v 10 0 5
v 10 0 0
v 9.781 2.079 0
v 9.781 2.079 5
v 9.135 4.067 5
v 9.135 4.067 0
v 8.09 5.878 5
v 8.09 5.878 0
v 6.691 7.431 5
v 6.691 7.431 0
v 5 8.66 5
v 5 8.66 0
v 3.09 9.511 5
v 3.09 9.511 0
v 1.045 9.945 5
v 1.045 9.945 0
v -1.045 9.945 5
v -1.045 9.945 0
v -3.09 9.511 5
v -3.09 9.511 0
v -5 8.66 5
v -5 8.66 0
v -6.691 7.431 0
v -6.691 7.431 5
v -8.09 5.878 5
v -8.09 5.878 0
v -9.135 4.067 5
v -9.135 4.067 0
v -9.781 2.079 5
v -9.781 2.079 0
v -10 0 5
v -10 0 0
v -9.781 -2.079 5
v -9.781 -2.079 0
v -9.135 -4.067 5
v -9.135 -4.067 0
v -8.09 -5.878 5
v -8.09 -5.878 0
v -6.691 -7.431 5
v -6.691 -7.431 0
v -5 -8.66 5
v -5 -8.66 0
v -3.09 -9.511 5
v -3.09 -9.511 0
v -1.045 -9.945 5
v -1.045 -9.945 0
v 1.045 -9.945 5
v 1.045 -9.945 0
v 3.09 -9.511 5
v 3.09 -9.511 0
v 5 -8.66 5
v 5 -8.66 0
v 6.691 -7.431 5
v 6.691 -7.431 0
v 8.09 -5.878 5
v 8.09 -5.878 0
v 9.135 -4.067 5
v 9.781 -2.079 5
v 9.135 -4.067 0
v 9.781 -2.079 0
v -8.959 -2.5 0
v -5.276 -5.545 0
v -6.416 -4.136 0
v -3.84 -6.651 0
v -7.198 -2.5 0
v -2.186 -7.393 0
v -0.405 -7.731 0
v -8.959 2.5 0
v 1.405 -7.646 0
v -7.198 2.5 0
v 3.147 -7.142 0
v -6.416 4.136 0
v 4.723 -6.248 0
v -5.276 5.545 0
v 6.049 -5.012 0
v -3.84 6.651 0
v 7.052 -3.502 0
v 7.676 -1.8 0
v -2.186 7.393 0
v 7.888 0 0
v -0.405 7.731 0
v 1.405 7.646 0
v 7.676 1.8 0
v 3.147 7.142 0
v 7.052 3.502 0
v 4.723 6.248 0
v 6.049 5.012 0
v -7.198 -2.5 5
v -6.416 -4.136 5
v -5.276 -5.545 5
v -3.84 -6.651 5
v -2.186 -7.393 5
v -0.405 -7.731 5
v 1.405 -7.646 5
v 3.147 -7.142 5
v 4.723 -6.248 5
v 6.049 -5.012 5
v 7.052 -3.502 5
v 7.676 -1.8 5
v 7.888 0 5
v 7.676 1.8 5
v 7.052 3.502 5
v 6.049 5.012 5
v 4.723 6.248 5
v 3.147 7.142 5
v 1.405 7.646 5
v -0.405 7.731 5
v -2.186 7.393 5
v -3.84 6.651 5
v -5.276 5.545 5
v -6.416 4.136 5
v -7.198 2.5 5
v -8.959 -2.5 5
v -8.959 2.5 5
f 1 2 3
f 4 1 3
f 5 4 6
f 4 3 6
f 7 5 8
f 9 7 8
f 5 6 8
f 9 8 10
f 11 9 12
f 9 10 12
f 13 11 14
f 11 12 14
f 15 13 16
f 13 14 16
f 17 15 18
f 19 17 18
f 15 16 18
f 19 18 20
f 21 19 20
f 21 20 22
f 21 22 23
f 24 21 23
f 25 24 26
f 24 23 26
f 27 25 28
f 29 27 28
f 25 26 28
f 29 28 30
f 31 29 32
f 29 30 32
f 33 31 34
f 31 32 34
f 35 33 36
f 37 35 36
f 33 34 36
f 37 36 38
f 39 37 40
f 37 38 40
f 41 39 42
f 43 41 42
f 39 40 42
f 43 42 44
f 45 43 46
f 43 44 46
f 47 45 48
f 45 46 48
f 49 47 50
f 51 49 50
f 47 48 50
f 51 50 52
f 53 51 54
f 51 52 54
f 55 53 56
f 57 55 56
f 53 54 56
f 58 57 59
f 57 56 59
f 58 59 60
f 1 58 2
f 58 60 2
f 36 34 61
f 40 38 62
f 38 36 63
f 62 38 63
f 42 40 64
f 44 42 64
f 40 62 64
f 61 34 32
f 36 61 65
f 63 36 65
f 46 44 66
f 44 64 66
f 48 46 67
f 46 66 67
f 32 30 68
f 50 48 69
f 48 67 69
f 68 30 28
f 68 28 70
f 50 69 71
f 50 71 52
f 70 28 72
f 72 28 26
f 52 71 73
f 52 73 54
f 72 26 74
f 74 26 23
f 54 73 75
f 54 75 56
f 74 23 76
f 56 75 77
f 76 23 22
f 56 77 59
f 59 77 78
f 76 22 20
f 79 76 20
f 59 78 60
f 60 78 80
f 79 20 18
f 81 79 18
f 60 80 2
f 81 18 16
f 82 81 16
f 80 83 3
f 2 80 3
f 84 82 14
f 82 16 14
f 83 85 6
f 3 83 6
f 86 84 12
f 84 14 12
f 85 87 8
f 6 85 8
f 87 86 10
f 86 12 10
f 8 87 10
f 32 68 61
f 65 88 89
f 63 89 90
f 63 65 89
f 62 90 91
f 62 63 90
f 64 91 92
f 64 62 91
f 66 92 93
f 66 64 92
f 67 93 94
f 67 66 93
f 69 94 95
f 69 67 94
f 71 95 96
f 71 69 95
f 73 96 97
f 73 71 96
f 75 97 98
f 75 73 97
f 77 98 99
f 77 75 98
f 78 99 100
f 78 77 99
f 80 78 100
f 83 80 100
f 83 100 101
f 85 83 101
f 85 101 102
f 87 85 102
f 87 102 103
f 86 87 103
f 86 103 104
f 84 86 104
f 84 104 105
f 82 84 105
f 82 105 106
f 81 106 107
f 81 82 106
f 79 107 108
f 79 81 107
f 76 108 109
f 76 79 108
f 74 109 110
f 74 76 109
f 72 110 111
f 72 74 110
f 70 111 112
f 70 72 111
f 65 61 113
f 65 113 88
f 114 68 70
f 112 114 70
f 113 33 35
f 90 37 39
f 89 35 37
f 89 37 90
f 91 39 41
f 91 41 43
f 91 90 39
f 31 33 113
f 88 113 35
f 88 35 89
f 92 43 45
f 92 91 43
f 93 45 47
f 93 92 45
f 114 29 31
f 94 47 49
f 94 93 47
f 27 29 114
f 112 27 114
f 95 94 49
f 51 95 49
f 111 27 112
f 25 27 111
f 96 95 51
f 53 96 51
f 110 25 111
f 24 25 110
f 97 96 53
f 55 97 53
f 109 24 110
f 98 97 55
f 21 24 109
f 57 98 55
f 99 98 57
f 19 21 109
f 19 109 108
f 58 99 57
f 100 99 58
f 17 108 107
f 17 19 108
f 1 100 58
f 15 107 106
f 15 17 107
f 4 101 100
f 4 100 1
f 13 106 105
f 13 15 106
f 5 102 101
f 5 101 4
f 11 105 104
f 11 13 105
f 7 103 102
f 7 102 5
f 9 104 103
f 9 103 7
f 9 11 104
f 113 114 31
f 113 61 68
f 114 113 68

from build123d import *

# Parameters (mm, degrees)
F1_R     = 10
F2_DEPTH = 5
F0_R     = 7.75
F3_DEPTH = 25.4
F4_W     = 8.958675
F4_H     = 5
F5_DEPTH = 80


with BuildPart() as f2:
    # F1 (on Top) → F2 (new body)
    with BuildSketch(Plane.XY):
        Circle(F1_R)
    extrude(amount=F2_DEPTH)

    # F0 (on Top) → F3 (cut)
    with BuildSketch(Plane.XY):
        with Locations((0.138163, 0)):
            Circle(F0_R)
    extrude(amount=F3_DEPTH, mode=Mode.SUBTRACT)

    # F4 (on Top) → F5 (cut)
    with BuildSketch(Plane.XY):
        with Locations((-4.479337, 0)):
            Rectangle(F4_W, F4_H)
    extrude(amount=F5_DEPTH, mode=Mode.SUBTRACT)


solid = f2.part
